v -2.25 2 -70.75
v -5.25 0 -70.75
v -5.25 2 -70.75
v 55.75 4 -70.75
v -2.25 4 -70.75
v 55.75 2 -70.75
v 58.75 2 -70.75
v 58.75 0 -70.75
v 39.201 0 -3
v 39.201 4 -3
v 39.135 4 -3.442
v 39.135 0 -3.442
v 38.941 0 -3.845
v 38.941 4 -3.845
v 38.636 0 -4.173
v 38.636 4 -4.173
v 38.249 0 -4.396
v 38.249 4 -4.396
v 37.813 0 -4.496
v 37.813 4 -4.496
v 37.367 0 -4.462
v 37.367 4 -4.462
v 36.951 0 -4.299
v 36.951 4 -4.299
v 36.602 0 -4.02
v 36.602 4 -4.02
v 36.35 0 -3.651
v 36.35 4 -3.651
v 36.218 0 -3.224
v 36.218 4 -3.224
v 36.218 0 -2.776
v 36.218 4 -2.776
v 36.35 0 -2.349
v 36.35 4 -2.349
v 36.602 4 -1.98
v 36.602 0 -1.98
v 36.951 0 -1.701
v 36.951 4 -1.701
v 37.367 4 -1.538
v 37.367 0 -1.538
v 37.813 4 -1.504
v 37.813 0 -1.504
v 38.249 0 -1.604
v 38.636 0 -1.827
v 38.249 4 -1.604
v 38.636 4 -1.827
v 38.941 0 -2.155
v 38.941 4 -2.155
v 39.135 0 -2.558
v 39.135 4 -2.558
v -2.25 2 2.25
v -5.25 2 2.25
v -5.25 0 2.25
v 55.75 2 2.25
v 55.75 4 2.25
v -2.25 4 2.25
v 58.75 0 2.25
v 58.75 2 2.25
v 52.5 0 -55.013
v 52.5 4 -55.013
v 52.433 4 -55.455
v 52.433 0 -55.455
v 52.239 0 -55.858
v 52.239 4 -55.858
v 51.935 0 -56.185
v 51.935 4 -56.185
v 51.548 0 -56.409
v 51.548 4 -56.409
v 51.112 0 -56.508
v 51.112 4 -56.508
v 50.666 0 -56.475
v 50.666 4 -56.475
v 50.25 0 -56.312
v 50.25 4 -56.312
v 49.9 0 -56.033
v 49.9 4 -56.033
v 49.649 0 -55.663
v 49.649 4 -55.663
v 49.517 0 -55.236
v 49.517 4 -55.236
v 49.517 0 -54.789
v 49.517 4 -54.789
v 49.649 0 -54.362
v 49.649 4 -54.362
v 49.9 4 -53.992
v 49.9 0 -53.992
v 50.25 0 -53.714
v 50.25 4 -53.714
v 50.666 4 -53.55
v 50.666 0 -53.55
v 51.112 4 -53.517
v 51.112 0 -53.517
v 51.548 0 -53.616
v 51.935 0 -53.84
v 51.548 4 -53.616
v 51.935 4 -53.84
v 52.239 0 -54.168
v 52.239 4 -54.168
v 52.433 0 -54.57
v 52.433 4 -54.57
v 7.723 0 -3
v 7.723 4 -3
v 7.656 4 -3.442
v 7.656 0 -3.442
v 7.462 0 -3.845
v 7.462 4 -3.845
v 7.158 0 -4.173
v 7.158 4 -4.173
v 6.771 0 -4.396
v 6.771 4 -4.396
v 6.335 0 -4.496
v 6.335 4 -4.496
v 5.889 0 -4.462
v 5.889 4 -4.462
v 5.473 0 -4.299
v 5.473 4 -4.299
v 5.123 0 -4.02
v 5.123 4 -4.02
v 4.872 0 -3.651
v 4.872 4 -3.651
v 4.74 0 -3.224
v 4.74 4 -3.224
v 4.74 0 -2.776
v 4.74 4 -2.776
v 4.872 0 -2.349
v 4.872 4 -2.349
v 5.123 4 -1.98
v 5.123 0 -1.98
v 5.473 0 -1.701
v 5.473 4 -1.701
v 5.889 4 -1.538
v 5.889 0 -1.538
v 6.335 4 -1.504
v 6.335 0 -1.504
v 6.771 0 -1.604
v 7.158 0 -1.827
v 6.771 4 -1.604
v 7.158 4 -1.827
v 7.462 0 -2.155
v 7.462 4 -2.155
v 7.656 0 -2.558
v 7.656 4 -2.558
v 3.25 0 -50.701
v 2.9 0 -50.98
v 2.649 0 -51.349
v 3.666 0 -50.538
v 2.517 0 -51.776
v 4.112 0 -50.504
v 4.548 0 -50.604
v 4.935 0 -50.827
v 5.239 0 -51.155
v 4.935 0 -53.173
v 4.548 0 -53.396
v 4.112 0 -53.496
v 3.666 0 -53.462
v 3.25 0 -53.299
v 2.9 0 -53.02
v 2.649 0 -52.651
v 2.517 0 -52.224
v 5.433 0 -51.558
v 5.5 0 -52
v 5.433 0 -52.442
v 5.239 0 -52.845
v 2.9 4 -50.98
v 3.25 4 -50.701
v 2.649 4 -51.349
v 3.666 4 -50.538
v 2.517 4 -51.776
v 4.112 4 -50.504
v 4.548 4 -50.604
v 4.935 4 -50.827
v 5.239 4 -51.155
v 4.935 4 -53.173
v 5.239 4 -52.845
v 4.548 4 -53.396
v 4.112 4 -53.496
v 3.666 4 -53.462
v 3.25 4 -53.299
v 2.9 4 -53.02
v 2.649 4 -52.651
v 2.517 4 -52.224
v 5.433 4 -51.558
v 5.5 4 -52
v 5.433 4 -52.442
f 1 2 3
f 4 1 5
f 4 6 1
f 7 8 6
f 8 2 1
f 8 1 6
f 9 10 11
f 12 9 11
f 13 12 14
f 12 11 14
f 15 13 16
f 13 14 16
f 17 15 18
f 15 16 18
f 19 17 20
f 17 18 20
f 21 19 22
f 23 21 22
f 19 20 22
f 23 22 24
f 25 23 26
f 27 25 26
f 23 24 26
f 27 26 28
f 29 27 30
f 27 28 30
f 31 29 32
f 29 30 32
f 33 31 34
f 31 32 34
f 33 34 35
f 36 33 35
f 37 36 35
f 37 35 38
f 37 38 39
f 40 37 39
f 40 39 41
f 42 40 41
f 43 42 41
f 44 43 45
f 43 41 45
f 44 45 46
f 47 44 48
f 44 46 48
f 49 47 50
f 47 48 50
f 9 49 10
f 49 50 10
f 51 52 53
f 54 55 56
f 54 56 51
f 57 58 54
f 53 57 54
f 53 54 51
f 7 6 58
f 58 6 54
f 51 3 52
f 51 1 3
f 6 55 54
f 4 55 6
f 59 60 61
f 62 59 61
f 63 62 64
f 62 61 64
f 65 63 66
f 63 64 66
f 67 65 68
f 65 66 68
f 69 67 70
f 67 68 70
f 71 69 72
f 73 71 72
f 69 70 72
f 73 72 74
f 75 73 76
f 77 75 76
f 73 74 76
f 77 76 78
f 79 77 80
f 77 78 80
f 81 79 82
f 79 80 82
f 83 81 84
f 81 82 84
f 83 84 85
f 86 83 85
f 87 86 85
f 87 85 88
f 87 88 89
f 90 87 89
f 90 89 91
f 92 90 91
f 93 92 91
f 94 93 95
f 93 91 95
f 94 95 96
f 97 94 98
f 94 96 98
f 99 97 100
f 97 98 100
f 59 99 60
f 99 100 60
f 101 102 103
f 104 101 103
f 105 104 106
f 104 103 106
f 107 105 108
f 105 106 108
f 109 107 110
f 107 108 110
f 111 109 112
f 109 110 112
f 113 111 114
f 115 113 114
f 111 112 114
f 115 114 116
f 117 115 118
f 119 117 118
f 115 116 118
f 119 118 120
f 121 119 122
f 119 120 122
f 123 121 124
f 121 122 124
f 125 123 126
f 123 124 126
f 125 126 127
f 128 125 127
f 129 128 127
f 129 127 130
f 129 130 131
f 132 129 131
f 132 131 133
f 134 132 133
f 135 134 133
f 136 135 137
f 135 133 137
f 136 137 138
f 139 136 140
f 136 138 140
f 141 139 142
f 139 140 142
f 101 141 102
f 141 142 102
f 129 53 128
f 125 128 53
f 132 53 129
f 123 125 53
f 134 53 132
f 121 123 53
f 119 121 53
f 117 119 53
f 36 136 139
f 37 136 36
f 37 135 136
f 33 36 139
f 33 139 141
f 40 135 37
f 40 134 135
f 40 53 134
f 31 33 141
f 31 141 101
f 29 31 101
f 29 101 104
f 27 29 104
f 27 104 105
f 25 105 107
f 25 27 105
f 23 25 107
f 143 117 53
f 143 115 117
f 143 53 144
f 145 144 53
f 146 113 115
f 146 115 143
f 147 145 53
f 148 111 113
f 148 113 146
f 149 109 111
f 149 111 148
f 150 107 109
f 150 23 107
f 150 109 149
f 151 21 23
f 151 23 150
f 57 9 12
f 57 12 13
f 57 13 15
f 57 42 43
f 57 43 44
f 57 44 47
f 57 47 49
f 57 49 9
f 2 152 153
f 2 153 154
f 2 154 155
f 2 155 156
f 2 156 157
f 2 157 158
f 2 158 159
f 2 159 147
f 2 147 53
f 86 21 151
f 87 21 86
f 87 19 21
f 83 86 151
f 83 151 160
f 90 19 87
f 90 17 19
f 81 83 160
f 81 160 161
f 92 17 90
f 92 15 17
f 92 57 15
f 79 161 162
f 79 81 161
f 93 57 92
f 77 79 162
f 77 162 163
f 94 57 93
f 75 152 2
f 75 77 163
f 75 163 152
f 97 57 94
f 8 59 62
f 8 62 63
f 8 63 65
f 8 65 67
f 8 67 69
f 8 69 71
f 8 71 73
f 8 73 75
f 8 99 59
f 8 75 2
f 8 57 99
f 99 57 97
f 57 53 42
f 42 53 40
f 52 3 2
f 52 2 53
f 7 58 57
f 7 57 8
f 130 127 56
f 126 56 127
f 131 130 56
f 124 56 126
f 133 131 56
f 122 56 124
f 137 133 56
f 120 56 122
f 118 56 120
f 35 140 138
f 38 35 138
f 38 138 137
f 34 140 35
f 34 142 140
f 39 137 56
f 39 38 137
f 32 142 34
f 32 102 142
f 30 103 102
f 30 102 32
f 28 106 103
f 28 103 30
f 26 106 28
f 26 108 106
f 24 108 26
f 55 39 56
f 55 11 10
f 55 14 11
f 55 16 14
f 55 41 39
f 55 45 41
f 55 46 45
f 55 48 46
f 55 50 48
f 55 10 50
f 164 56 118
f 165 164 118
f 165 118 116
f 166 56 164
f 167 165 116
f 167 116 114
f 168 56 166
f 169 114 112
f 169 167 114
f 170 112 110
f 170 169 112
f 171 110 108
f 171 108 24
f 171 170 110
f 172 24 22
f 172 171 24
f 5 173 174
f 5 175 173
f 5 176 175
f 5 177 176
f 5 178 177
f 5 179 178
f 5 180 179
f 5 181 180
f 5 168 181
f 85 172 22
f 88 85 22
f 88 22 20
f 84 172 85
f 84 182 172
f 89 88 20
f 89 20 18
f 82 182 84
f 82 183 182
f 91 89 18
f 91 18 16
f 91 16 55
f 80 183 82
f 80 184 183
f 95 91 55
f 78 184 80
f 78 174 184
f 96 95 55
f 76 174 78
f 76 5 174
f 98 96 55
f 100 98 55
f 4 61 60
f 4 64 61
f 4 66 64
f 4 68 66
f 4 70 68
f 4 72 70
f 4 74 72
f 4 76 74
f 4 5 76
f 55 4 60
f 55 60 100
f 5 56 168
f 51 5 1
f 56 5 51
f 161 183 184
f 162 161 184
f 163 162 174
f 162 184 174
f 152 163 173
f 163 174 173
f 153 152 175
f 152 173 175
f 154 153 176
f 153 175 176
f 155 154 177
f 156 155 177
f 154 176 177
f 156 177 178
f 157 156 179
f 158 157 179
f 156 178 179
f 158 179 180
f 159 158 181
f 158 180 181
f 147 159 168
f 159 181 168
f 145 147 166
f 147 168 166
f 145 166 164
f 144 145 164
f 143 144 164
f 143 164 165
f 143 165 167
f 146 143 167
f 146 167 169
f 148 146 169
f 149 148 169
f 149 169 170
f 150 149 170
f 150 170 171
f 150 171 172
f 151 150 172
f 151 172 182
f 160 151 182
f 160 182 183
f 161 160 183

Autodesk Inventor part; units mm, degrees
ref_plane "YZ Plane" through (0, 0, 0) normal (1, 0, 0) x (0, 1, 0)
ref_plane "XZ Plane" through (0, 0, 0) normal (0, 1, 0) x (-1, 0, 0)
ref_plane "XY Plane" through (0, 0, 0) normal (0, 0, 1) x (1, 0, 0)
sketch "Sketch1" plane through (0, 0, 0) normal (0, 1, 0) x (-1, 0, 0)
  line L0 (0, 0) -> (-53.5, 0)
  line L1 (-53.5, 0) -> (-53.5, -68.5)
  line L2 (-53.5, -68.5) -> (0, -68.5)
  line L3 (0, -68.5) -> (0, 0)
  dimension "d0" = 53.5
  dimension "d1" = 68.5
extrude "Extrusion1" add sketch "Sketch1" along normal blind 4
sketch "Sketch2" plane through (0, 4, 0) normal (0, 1, 0) x (1, 0, 0)
  circle A0 centre (51, 55.0126) radius 1.5
  line L0 (53.5, 68.5) -> (0, 68.5) projected
  line L1 (53.5, 0) -> (53.5, 68.5) projected
  circle A1 centre (4, 52) radius 1.5
  line L2 (0, 68.5) -> (0, 0) projected
  circle A2 centre (37.7012, 3) radius 1.5
  line L3 (0, 0) -> (53.5, 0) projected
  circle A3 centre (6.223, 3) radius 1.5
  dimension "d4" = 3
  dimension "d5" = 13.4874
  dimension "d6" = 2.5
  dimension "d7" = 3
  dimension "d8" = 16.5
  dimension "d9" = 4
  dimension "d10" = 3
  dimension "d11" = 15.7988
  dimension "d12" = 3
  dimension "d13" = 3
  dimension "d14" = 3
  dimension "d15" = 6.223
extrude "Extrusion2" cut sketch "Sketch2" against normal blind 12 contours A0 | A1 | A2 | A3
sketch "Sketch3" plane through (0, 4, 0) normal (0, 1, 0) x (1, 0, 0)
  line L0 (0, 0) -> (53.5, 0) projected
  line L1 (53.5, 0) -> (53.5, 68.5) projected
  line L2 (53.5, 68.5) -> (0, 68.5) projected
  line L3 (0, 68.5) -> (0, 0) projected
  line L4 (-2.25, -2.25) -> (55.75, -2.25)
  line L5 (55.75, -2.25) -> (55.75, 70.75)
  line L6 (55.75, 70.75) -> (-2.25, 70.75)
  line L7 (-2.25, 70.75) -> (-2.25, -2.25)
  dimension "d18" = 2.25
extrude "Extrusion3" add sketch "Sketch3" against normal blind 4
sketch "Sketch6" plane through (55.75, 4, 2.25) normal (1, 0, 0) x (0, 0, -1)
  line L0 (0, 0) -> (73, 0) projected
  line L1 (73, -4) -> (0, -4) projected
  line L2 (0, 0) -> (73, 0) projected
  line L3 (0, 0) -> (0, -4) projected
  line L4 (73, -4) -> (0, -4) projected
  line L5 (73, 0) -> (73, -4) projected
  line L6 (73, 0) -> (73, -4) projected
  line L7 (0, -4) -> (73, -4)
  line L8 (73, -4) -> (73, -2)
  line L9 (73, -2) -> (0, -2)
  line L10 (0, -2) -> (0, -4)
  point P0 (2.25, -4)
  dimension "d33" = 2
extrude "Extrusion6" add sketch "Sketch6" along normal blind 3 contours L9 L5 L1 L3
sketch "Sketch7" plane through (-2.25, 4, -70.75) normal (-1, 0, 0) x (0, 0, 1)
  line L0 (73, -4) -> (0, -4) projected
  line L1 (0, -4) -> (0, -2) projected
  line L2 (0, -2) -> (73, -2) projected
  line L3 (73, -2) -> (73, -4) projected
  point P0 (70.75, -4)
extrude "Extrusion7" add sketch "Sketch7" along normal blind 3
properties part number "uno-holder"
